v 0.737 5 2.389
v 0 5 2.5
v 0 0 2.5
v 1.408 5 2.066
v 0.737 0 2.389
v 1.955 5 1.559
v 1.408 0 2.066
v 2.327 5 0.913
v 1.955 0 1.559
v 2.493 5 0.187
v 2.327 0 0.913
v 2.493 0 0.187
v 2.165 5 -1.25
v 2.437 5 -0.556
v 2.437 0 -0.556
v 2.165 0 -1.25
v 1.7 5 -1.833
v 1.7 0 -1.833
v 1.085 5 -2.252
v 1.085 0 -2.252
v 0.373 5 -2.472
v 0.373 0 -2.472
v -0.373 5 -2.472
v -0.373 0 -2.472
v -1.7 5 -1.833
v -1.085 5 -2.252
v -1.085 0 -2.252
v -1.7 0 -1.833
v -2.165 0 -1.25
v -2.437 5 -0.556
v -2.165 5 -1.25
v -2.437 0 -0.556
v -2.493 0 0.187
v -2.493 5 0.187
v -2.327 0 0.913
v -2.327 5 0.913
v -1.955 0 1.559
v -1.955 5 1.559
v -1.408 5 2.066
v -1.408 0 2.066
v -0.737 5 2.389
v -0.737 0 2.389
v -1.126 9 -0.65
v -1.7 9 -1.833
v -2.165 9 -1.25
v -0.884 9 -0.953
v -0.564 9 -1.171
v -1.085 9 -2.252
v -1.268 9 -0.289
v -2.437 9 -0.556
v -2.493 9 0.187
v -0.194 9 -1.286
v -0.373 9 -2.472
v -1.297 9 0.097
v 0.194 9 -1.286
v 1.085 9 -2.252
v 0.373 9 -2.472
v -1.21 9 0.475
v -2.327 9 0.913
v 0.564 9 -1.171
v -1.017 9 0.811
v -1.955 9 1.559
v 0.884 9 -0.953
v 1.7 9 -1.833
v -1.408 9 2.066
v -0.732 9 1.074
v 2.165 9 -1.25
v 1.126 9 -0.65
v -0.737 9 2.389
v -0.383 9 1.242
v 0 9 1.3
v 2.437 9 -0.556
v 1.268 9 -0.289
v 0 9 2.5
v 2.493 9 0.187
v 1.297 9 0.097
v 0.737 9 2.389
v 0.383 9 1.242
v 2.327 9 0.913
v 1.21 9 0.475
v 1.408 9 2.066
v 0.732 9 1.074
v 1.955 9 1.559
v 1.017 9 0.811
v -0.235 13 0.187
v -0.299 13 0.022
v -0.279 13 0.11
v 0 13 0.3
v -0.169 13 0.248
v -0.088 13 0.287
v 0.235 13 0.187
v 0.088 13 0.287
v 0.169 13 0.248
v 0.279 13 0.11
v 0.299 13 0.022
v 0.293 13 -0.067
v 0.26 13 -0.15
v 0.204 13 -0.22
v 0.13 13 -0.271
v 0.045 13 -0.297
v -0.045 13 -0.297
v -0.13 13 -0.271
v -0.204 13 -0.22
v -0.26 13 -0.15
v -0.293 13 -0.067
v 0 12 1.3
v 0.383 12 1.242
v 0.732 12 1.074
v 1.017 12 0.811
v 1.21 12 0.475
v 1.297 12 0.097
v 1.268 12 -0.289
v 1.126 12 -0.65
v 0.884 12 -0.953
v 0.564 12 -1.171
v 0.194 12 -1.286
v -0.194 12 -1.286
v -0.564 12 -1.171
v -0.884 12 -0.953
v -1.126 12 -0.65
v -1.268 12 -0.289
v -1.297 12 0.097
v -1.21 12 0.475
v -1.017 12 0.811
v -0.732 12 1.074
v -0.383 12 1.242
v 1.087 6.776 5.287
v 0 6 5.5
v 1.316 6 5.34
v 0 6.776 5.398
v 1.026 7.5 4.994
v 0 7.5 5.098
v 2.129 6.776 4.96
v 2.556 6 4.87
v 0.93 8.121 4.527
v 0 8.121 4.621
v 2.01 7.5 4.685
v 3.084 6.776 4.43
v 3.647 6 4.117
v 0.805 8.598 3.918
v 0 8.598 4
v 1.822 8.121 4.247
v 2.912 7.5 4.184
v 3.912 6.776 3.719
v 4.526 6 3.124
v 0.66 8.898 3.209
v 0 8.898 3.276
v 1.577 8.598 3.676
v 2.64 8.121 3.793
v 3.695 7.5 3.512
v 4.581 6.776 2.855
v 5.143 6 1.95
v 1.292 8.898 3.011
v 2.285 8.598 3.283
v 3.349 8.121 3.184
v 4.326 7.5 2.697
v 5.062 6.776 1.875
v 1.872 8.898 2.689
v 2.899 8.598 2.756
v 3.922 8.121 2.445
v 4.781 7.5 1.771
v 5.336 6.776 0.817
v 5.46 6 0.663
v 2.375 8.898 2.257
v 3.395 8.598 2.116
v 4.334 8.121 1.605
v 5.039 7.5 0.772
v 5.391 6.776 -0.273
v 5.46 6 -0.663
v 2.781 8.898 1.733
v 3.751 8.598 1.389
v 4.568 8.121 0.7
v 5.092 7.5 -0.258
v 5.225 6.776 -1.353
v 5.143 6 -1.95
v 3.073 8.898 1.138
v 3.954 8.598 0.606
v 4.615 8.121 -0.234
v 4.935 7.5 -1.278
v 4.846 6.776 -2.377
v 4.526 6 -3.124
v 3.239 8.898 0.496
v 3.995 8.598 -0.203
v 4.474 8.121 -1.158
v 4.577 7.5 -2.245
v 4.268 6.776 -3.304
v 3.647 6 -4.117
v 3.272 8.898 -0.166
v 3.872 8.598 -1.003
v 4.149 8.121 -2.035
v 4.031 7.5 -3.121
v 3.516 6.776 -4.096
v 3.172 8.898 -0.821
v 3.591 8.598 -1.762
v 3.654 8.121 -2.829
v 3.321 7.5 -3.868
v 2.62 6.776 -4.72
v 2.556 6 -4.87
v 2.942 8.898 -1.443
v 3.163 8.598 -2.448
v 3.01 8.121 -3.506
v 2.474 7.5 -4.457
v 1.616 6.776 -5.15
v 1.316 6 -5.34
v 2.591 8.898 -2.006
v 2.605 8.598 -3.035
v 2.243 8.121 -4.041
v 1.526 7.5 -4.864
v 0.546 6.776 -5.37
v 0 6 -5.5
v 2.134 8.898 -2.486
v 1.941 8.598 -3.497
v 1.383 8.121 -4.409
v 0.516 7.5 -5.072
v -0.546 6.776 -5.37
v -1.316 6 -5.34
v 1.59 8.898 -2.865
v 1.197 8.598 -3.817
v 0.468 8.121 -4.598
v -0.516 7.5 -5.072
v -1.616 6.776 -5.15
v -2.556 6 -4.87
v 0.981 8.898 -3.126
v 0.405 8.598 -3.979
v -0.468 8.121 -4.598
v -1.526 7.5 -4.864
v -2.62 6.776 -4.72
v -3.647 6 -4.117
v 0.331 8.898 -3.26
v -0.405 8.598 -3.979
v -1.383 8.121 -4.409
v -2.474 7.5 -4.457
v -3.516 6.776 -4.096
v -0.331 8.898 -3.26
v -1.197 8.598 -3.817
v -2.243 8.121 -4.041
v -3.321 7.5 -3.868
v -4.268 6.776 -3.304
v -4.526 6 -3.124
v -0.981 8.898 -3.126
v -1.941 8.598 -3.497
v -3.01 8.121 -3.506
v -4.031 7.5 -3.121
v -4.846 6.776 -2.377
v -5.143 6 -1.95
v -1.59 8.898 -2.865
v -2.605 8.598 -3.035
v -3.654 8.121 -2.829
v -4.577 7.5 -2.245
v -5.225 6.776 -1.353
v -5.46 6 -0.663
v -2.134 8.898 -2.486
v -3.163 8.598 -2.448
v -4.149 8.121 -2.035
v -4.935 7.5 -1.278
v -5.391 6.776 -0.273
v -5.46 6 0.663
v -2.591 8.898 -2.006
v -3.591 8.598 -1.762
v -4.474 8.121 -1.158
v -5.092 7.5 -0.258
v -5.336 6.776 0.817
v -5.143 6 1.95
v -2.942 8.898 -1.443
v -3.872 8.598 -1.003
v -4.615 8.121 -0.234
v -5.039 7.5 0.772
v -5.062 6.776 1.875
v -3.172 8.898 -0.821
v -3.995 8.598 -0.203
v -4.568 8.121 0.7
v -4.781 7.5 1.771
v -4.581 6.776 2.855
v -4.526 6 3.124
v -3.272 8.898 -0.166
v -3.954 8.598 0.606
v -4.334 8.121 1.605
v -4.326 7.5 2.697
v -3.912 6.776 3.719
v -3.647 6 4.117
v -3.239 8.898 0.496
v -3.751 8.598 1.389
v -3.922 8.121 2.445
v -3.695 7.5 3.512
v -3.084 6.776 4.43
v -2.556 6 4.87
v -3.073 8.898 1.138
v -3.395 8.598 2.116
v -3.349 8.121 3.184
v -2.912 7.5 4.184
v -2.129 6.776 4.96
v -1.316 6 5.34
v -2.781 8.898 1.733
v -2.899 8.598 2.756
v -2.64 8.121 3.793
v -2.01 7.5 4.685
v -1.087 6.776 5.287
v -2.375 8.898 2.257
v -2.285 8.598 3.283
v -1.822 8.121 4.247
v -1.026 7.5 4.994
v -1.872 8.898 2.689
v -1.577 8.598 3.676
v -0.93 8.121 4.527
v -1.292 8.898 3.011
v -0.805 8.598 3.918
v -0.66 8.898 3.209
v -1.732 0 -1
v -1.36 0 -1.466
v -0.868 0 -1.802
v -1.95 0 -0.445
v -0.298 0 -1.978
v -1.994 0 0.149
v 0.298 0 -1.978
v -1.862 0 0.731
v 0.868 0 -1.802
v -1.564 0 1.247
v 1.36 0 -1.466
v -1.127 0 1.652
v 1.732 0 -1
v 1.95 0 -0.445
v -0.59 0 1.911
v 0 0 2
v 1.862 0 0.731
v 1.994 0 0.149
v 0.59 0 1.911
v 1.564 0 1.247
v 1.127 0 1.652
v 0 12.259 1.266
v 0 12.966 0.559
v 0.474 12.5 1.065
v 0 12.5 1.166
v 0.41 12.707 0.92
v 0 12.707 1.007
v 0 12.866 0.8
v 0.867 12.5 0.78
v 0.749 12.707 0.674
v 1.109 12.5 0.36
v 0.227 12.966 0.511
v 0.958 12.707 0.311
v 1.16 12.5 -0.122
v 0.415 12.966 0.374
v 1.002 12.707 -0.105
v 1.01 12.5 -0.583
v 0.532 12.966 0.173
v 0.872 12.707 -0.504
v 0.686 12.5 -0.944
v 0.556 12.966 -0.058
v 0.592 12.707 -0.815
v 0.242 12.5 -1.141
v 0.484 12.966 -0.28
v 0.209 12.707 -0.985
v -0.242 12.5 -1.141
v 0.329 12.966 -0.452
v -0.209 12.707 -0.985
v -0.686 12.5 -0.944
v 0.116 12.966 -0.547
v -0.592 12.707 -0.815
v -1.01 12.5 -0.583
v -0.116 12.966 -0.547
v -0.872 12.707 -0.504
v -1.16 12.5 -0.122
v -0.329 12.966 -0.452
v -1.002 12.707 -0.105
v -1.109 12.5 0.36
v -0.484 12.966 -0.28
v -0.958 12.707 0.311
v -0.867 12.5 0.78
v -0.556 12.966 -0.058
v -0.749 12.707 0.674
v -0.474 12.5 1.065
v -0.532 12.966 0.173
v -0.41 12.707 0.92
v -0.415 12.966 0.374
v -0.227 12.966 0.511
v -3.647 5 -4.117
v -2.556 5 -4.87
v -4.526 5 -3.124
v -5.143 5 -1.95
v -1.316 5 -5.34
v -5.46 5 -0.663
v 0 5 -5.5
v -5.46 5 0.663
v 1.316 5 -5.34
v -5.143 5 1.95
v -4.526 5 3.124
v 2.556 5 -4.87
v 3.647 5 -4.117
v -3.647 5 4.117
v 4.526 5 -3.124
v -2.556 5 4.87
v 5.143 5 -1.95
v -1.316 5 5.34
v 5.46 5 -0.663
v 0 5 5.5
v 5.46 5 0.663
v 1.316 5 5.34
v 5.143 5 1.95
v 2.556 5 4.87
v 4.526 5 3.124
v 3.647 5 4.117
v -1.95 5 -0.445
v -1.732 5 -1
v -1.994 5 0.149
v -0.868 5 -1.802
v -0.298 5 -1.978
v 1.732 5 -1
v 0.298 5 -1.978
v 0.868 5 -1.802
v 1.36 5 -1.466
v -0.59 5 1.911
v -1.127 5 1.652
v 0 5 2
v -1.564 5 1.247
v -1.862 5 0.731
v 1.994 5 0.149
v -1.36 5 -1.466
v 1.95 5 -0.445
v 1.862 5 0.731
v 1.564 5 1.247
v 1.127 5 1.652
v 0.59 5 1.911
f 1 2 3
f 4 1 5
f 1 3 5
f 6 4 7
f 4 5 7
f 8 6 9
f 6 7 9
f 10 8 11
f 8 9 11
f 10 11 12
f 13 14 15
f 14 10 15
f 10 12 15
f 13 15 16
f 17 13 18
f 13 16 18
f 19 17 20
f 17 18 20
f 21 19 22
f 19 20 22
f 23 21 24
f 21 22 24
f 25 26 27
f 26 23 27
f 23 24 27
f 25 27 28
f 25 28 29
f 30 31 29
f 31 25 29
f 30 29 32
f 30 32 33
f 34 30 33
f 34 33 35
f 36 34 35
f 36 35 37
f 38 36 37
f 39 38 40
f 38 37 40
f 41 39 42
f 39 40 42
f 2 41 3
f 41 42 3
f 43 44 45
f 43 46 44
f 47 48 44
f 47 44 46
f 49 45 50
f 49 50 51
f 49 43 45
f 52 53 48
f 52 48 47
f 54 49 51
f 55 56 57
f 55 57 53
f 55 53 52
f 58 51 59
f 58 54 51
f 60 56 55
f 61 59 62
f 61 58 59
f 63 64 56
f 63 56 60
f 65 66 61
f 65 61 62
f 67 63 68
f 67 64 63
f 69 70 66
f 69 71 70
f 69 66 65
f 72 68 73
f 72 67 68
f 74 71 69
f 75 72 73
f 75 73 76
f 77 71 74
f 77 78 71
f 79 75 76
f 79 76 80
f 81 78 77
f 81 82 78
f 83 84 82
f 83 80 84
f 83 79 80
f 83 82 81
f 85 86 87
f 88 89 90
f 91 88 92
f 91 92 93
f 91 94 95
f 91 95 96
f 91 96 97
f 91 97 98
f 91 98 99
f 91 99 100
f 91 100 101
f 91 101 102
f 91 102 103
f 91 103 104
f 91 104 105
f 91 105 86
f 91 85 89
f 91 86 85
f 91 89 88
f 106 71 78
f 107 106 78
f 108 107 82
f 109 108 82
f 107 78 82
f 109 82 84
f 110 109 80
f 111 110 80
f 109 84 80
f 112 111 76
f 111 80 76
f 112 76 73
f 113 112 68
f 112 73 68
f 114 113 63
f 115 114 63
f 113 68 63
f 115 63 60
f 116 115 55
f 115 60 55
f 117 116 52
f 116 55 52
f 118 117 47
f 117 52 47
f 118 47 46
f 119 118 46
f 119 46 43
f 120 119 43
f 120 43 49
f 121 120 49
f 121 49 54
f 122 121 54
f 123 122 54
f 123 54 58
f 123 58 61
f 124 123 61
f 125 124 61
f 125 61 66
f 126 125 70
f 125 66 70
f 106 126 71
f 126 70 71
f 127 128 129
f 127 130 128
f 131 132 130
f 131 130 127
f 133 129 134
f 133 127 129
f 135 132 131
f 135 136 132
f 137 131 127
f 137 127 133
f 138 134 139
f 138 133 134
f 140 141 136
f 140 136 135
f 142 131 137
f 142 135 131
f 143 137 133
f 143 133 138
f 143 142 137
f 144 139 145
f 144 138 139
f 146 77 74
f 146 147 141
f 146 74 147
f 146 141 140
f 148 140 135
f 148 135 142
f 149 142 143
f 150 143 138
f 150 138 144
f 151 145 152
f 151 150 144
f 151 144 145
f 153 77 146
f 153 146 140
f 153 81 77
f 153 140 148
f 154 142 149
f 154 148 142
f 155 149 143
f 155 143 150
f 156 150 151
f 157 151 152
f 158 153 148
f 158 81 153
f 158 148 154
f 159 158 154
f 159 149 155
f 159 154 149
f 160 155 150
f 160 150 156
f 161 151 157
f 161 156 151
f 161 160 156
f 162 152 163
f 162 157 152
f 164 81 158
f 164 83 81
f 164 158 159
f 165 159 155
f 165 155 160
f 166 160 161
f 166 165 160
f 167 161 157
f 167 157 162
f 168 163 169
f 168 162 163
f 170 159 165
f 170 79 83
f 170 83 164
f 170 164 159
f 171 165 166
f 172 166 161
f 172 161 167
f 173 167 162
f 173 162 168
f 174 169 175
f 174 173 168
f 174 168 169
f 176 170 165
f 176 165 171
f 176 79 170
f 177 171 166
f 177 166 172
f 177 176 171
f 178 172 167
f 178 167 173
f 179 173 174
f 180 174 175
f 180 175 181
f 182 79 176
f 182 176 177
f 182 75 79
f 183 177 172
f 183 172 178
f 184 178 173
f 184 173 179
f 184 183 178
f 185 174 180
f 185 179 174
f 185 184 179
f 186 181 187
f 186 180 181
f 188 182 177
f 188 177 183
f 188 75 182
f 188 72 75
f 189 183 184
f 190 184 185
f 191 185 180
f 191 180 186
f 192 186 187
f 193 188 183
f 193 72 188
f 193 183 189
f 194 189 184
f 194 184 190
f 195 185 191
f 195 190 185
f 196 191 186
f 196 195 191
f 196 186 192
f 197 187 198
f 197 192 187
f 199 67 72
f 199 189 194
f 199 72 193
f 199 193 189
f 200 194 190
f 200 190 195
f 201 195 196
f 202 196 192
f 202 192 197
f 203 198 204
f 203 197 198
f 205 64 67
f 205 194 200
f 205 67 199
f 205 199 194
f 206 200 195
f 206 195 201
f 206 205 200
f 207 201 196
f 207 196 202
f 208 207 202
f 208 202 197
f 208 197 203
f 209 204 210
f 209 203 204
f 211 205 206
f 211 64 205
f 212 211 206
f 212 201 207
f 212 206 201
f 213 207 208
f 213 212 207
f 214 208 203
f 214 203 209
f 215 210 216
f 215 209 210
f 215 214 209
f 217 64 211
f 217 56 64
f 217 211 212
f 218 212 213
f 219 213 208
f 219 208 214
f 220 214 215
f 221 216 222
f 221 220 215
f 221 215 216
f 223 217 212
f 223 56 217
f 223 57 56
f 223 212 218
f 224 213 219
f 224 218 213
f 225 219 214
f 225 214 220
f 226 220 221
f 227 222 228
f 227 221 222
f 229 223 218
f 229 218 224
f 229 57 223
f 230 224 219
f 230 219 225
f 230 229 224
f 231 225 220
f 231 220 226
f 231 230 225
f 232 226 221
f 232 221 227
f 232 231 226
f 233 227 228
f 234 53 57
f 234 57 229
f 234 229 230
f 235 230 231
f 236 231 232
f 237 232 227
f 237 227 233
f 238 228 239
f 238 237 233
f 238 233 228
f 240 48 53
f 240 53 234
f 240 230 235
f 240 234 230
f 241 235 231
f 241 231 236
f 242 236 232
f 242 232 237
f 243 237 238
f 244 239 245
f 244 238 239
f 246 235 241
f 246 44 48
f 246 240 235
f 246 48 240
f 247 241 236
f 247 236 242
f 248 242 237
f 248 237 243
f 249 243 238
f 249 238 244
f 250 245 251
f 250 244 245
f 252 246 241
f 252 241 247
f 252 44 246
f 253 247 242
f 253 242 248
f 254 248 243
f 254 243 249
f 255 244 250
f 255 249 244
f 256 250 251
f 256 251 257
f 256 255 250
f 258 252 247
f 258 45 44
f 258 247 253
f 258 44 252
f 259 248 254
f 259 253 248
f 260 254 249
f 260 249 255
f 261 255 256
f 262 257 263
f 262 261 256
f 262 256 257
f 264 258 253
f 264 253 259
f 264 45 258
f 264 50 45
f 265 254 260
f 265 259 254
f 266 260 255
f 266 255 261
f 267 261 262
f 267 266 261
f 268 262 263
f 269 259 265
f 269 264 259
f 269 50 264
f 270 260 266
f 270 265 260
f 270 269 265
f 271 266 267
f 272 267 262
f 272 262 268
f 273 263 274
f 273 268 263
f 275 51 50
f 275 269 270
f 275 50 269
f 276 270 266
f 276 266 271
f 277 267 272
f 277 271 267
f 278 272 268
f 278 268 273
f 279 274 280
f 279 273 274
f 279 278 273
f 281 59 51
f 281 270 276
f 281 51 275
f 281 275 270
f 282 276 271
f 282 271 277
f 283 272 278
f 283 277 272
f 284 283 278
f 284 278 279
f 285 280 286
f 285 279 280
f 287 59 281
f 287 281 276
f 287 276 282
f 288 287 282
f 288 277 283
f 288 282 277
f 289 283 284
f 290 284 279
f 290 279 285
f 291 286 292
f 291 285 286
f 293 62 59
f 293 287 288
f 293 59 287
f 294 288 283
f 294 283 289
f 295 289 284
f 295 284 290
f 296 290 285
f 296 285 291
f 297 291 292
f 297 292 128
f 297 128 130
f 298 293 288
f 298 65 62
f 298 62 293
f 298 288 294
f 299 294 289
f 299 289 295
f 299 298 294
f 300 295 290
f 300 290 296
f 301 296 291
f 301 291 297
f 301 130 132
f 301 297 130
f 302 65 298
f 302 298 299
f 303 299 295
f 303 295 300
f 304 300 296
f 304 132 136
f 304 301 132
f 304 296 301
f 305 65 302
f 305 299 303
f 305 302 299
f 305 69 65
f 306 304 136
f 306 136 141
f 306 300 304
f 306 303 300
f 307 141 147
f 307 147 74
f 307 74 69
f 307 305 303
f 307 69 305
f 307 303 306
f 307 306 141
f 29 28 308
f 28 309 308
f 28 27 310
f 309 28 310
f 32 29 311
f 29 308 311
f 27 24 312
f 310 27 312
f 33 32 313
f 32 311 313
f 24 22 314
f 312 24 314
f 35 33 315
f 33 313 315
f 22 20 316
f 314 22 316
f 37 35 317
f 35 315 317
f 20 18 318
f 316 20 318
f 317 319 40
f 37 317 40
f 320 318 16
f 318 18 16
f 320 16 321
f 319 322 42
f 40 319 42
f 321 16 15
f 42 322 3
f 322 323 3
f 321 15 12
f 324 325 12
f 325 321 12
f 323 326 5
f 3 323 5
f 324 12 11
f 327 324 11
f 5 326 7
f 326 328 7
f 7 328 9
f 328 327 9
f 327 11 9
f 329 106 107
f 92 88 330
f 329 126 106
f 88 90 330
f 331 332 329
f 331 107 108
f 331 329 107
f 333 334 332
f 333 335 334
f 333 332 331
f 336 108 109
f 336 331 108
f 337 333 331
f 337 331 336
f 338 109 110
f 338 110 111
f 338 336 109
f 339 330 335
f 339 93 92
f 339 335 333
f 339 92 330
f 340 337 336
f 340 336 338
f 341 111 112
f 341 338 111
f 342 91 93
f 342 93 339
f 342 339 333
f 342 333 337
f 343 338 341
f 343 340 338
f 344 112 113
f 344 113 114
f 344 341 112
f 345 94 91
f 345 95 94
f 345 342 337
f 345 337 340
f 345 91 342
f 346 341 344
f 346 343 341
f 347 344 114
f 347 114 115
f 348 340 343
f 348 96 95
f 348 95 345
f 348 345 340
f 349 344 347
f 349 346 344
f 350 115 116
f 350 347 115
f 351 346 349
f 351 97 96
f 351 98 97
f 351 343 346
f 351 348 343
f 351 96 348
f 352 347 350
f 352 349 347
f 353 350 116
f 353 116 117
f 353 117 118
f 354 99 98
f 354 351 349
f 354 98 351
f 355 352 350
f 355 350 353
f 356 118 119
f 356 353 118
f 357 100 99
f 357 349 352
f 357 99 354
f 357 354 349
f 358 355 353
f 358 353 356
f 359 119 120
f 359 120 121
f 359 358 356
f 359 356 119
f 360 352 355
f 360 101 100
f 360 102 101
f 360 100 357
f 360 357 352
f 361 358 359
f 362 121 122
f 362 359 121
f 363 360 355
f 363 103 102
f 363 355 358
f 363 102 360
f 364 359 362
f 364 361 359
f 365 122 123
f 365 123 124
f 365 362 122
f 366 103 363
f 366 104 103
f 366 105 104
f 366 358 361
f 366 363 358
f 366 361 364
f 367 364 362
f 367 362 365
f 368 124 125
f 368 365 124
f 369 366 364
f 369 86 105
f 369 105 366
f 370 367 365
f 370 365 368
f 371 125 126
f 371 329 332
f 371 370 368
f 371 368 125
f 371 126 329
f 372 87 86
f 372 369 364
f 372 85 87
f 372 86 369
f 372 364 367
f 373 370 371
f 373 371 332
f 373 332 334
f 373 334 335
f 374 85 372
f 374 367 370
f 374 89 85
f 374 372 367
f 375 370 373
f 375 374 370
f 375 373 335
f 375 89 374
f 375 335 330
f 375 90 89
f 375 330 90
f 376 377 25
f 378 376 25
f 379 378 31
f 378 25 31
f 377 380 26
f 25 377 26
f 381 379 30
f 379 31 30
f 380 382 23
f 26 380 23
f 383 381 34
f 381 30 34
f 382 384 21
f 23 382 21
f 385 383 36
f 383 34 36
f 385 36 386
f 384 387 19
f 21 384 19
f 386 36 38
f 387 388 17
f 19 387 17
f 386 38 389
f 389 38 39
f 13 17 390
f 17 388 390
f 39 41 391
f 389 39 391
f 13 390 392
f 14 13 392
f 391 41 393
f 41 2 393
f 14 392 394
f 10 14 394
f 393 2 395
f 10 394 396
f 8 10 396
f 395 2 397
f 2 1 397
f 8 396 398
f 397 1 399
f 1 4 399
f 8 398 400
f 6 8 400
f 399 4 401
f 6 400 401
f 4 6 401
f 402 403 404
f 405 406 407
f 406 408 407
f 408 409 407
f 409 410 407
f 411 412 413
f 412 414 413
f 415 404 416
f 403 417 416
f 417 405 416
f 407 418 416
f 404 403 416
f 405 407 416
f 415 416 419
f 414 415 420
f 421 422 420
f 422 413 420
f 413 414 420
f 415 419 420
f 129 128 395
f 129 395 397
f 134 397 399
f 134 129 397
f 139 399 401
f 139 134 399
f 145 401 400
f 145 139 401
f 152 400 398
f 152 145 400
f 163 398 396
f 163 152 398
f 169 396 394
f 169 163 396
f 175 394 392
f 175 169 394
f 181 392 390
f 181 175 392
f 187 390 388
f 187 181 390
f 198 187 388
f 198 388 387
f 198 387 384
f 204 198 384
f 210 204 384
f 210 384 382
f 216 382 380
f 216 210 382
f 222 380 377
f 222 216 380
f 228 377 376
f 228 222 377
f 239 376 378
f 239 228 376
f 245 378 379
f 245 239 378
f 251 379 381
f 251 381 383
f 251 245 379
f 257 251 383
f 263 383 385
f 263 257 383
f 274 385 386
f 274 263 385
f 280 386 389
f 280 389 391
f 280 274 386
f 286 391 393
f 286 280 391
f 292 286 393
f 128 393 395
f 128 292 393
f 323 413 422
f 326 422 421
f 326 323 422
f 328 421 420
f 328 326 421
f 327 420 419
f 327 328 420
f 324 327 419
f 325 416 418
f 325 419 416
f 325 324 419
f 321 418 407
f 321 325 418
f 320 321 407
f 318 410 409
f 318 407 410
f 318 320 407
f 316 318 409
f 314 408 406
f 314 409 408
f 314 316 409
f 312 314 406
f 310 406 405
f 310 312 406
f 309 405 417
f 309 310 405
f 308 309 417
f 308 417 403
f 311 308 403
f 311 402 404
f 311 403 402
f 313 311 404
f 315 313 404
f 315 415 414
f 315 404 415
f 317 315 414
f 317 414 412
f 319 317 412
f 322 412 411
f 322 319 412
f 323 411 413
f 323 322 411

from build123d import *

# Parameters (mm, degrees)
IZIM1_R                     = 2.5
IZIM1_R_2                   = 2
Y_KSEKLIK_EKSTR_ZYON1_DEPTH = 9
IZIM2_R                     = 5.5
Y_KSEKLIK_EKSTR_ZYON2_DEPTH = 4
RADYUS1_R                   = 3
IZIM3_R                     = 1.300236586
Y_KSEKLIK_EKSTR_ZYON3_DEPTH = 4
RADYUS2_R                   = 1


with BuildPart() as part:
    # Çizim1 → Yükseklik-Ekstrüzyon1 (new body)
    with BuildSketch(Plane(origin=(0, 0, 0), x_dir=(1, 0, 0), z_dir=(0, 1, 0))):
        with Locations(Location((0, 0, 0), (0, 0, 270))):
            Circle(IZIM1_R)
        with Locations(Location((0, 0, 0), (0, 0, 270))):
            Circle(IZIM1_R_2, mode=Mode.SUBTRACT)
    extrude(amount=Y_KSEKLIK_EKSTR_ZYON1_DEPTH)



with BuildPart() as body_2:
    # Çizim2 → Yükseklik-Ekstrüzyon2 (new body)
    with BuildSketch(Plane(origin=(0, 9, 0), x_dir=(1, 0, 0), z_dir=(0, 1, 0))):
        with Locations(Location((0, 0, 0), (0, 0, 270))):
            Circle(IZIM2_R)
    extrude(amount=-Y_KSEKLIK_EKSTR_ZYON2_DEPTH)

    # Radyus1
    radyus1_edges = [body_2.edges().sort_by_distance(p)[0] for p in [
        (0, 9, -5.5),
    ]]
    fillet(radyus1_edges, radius=RADYUS1_R)


with BuildPart() as part_1:
    add(part.part)

    add(body_2.part)  # Yükseklik-Ekstrüzyon3 merges body 2
    # Çizim3 → Yükseklik-Ekstrüzyon3 (add)
    with BuildSketch(Plane(origin=(0, 9, 0), x_dir=(1, 0, 0), z_dir=(0, 1, 0))):
        with Locations(Location((0, 0, 0), (0, 0, 270))):
            Circle(IZIM3_R)
    extrude(amount=Y_KSEKLIK_EKSTR_ZYON3_DEPTH)

    # Radyus2
    radyus2_edges = [part_1.edges().sort_by_distance(p)[0] for p in [
        (0, 13, -1.300236586),
    ]]
    fillet(radyus2_edges, radius=RADYUS2_R)


solid = part_1.part
